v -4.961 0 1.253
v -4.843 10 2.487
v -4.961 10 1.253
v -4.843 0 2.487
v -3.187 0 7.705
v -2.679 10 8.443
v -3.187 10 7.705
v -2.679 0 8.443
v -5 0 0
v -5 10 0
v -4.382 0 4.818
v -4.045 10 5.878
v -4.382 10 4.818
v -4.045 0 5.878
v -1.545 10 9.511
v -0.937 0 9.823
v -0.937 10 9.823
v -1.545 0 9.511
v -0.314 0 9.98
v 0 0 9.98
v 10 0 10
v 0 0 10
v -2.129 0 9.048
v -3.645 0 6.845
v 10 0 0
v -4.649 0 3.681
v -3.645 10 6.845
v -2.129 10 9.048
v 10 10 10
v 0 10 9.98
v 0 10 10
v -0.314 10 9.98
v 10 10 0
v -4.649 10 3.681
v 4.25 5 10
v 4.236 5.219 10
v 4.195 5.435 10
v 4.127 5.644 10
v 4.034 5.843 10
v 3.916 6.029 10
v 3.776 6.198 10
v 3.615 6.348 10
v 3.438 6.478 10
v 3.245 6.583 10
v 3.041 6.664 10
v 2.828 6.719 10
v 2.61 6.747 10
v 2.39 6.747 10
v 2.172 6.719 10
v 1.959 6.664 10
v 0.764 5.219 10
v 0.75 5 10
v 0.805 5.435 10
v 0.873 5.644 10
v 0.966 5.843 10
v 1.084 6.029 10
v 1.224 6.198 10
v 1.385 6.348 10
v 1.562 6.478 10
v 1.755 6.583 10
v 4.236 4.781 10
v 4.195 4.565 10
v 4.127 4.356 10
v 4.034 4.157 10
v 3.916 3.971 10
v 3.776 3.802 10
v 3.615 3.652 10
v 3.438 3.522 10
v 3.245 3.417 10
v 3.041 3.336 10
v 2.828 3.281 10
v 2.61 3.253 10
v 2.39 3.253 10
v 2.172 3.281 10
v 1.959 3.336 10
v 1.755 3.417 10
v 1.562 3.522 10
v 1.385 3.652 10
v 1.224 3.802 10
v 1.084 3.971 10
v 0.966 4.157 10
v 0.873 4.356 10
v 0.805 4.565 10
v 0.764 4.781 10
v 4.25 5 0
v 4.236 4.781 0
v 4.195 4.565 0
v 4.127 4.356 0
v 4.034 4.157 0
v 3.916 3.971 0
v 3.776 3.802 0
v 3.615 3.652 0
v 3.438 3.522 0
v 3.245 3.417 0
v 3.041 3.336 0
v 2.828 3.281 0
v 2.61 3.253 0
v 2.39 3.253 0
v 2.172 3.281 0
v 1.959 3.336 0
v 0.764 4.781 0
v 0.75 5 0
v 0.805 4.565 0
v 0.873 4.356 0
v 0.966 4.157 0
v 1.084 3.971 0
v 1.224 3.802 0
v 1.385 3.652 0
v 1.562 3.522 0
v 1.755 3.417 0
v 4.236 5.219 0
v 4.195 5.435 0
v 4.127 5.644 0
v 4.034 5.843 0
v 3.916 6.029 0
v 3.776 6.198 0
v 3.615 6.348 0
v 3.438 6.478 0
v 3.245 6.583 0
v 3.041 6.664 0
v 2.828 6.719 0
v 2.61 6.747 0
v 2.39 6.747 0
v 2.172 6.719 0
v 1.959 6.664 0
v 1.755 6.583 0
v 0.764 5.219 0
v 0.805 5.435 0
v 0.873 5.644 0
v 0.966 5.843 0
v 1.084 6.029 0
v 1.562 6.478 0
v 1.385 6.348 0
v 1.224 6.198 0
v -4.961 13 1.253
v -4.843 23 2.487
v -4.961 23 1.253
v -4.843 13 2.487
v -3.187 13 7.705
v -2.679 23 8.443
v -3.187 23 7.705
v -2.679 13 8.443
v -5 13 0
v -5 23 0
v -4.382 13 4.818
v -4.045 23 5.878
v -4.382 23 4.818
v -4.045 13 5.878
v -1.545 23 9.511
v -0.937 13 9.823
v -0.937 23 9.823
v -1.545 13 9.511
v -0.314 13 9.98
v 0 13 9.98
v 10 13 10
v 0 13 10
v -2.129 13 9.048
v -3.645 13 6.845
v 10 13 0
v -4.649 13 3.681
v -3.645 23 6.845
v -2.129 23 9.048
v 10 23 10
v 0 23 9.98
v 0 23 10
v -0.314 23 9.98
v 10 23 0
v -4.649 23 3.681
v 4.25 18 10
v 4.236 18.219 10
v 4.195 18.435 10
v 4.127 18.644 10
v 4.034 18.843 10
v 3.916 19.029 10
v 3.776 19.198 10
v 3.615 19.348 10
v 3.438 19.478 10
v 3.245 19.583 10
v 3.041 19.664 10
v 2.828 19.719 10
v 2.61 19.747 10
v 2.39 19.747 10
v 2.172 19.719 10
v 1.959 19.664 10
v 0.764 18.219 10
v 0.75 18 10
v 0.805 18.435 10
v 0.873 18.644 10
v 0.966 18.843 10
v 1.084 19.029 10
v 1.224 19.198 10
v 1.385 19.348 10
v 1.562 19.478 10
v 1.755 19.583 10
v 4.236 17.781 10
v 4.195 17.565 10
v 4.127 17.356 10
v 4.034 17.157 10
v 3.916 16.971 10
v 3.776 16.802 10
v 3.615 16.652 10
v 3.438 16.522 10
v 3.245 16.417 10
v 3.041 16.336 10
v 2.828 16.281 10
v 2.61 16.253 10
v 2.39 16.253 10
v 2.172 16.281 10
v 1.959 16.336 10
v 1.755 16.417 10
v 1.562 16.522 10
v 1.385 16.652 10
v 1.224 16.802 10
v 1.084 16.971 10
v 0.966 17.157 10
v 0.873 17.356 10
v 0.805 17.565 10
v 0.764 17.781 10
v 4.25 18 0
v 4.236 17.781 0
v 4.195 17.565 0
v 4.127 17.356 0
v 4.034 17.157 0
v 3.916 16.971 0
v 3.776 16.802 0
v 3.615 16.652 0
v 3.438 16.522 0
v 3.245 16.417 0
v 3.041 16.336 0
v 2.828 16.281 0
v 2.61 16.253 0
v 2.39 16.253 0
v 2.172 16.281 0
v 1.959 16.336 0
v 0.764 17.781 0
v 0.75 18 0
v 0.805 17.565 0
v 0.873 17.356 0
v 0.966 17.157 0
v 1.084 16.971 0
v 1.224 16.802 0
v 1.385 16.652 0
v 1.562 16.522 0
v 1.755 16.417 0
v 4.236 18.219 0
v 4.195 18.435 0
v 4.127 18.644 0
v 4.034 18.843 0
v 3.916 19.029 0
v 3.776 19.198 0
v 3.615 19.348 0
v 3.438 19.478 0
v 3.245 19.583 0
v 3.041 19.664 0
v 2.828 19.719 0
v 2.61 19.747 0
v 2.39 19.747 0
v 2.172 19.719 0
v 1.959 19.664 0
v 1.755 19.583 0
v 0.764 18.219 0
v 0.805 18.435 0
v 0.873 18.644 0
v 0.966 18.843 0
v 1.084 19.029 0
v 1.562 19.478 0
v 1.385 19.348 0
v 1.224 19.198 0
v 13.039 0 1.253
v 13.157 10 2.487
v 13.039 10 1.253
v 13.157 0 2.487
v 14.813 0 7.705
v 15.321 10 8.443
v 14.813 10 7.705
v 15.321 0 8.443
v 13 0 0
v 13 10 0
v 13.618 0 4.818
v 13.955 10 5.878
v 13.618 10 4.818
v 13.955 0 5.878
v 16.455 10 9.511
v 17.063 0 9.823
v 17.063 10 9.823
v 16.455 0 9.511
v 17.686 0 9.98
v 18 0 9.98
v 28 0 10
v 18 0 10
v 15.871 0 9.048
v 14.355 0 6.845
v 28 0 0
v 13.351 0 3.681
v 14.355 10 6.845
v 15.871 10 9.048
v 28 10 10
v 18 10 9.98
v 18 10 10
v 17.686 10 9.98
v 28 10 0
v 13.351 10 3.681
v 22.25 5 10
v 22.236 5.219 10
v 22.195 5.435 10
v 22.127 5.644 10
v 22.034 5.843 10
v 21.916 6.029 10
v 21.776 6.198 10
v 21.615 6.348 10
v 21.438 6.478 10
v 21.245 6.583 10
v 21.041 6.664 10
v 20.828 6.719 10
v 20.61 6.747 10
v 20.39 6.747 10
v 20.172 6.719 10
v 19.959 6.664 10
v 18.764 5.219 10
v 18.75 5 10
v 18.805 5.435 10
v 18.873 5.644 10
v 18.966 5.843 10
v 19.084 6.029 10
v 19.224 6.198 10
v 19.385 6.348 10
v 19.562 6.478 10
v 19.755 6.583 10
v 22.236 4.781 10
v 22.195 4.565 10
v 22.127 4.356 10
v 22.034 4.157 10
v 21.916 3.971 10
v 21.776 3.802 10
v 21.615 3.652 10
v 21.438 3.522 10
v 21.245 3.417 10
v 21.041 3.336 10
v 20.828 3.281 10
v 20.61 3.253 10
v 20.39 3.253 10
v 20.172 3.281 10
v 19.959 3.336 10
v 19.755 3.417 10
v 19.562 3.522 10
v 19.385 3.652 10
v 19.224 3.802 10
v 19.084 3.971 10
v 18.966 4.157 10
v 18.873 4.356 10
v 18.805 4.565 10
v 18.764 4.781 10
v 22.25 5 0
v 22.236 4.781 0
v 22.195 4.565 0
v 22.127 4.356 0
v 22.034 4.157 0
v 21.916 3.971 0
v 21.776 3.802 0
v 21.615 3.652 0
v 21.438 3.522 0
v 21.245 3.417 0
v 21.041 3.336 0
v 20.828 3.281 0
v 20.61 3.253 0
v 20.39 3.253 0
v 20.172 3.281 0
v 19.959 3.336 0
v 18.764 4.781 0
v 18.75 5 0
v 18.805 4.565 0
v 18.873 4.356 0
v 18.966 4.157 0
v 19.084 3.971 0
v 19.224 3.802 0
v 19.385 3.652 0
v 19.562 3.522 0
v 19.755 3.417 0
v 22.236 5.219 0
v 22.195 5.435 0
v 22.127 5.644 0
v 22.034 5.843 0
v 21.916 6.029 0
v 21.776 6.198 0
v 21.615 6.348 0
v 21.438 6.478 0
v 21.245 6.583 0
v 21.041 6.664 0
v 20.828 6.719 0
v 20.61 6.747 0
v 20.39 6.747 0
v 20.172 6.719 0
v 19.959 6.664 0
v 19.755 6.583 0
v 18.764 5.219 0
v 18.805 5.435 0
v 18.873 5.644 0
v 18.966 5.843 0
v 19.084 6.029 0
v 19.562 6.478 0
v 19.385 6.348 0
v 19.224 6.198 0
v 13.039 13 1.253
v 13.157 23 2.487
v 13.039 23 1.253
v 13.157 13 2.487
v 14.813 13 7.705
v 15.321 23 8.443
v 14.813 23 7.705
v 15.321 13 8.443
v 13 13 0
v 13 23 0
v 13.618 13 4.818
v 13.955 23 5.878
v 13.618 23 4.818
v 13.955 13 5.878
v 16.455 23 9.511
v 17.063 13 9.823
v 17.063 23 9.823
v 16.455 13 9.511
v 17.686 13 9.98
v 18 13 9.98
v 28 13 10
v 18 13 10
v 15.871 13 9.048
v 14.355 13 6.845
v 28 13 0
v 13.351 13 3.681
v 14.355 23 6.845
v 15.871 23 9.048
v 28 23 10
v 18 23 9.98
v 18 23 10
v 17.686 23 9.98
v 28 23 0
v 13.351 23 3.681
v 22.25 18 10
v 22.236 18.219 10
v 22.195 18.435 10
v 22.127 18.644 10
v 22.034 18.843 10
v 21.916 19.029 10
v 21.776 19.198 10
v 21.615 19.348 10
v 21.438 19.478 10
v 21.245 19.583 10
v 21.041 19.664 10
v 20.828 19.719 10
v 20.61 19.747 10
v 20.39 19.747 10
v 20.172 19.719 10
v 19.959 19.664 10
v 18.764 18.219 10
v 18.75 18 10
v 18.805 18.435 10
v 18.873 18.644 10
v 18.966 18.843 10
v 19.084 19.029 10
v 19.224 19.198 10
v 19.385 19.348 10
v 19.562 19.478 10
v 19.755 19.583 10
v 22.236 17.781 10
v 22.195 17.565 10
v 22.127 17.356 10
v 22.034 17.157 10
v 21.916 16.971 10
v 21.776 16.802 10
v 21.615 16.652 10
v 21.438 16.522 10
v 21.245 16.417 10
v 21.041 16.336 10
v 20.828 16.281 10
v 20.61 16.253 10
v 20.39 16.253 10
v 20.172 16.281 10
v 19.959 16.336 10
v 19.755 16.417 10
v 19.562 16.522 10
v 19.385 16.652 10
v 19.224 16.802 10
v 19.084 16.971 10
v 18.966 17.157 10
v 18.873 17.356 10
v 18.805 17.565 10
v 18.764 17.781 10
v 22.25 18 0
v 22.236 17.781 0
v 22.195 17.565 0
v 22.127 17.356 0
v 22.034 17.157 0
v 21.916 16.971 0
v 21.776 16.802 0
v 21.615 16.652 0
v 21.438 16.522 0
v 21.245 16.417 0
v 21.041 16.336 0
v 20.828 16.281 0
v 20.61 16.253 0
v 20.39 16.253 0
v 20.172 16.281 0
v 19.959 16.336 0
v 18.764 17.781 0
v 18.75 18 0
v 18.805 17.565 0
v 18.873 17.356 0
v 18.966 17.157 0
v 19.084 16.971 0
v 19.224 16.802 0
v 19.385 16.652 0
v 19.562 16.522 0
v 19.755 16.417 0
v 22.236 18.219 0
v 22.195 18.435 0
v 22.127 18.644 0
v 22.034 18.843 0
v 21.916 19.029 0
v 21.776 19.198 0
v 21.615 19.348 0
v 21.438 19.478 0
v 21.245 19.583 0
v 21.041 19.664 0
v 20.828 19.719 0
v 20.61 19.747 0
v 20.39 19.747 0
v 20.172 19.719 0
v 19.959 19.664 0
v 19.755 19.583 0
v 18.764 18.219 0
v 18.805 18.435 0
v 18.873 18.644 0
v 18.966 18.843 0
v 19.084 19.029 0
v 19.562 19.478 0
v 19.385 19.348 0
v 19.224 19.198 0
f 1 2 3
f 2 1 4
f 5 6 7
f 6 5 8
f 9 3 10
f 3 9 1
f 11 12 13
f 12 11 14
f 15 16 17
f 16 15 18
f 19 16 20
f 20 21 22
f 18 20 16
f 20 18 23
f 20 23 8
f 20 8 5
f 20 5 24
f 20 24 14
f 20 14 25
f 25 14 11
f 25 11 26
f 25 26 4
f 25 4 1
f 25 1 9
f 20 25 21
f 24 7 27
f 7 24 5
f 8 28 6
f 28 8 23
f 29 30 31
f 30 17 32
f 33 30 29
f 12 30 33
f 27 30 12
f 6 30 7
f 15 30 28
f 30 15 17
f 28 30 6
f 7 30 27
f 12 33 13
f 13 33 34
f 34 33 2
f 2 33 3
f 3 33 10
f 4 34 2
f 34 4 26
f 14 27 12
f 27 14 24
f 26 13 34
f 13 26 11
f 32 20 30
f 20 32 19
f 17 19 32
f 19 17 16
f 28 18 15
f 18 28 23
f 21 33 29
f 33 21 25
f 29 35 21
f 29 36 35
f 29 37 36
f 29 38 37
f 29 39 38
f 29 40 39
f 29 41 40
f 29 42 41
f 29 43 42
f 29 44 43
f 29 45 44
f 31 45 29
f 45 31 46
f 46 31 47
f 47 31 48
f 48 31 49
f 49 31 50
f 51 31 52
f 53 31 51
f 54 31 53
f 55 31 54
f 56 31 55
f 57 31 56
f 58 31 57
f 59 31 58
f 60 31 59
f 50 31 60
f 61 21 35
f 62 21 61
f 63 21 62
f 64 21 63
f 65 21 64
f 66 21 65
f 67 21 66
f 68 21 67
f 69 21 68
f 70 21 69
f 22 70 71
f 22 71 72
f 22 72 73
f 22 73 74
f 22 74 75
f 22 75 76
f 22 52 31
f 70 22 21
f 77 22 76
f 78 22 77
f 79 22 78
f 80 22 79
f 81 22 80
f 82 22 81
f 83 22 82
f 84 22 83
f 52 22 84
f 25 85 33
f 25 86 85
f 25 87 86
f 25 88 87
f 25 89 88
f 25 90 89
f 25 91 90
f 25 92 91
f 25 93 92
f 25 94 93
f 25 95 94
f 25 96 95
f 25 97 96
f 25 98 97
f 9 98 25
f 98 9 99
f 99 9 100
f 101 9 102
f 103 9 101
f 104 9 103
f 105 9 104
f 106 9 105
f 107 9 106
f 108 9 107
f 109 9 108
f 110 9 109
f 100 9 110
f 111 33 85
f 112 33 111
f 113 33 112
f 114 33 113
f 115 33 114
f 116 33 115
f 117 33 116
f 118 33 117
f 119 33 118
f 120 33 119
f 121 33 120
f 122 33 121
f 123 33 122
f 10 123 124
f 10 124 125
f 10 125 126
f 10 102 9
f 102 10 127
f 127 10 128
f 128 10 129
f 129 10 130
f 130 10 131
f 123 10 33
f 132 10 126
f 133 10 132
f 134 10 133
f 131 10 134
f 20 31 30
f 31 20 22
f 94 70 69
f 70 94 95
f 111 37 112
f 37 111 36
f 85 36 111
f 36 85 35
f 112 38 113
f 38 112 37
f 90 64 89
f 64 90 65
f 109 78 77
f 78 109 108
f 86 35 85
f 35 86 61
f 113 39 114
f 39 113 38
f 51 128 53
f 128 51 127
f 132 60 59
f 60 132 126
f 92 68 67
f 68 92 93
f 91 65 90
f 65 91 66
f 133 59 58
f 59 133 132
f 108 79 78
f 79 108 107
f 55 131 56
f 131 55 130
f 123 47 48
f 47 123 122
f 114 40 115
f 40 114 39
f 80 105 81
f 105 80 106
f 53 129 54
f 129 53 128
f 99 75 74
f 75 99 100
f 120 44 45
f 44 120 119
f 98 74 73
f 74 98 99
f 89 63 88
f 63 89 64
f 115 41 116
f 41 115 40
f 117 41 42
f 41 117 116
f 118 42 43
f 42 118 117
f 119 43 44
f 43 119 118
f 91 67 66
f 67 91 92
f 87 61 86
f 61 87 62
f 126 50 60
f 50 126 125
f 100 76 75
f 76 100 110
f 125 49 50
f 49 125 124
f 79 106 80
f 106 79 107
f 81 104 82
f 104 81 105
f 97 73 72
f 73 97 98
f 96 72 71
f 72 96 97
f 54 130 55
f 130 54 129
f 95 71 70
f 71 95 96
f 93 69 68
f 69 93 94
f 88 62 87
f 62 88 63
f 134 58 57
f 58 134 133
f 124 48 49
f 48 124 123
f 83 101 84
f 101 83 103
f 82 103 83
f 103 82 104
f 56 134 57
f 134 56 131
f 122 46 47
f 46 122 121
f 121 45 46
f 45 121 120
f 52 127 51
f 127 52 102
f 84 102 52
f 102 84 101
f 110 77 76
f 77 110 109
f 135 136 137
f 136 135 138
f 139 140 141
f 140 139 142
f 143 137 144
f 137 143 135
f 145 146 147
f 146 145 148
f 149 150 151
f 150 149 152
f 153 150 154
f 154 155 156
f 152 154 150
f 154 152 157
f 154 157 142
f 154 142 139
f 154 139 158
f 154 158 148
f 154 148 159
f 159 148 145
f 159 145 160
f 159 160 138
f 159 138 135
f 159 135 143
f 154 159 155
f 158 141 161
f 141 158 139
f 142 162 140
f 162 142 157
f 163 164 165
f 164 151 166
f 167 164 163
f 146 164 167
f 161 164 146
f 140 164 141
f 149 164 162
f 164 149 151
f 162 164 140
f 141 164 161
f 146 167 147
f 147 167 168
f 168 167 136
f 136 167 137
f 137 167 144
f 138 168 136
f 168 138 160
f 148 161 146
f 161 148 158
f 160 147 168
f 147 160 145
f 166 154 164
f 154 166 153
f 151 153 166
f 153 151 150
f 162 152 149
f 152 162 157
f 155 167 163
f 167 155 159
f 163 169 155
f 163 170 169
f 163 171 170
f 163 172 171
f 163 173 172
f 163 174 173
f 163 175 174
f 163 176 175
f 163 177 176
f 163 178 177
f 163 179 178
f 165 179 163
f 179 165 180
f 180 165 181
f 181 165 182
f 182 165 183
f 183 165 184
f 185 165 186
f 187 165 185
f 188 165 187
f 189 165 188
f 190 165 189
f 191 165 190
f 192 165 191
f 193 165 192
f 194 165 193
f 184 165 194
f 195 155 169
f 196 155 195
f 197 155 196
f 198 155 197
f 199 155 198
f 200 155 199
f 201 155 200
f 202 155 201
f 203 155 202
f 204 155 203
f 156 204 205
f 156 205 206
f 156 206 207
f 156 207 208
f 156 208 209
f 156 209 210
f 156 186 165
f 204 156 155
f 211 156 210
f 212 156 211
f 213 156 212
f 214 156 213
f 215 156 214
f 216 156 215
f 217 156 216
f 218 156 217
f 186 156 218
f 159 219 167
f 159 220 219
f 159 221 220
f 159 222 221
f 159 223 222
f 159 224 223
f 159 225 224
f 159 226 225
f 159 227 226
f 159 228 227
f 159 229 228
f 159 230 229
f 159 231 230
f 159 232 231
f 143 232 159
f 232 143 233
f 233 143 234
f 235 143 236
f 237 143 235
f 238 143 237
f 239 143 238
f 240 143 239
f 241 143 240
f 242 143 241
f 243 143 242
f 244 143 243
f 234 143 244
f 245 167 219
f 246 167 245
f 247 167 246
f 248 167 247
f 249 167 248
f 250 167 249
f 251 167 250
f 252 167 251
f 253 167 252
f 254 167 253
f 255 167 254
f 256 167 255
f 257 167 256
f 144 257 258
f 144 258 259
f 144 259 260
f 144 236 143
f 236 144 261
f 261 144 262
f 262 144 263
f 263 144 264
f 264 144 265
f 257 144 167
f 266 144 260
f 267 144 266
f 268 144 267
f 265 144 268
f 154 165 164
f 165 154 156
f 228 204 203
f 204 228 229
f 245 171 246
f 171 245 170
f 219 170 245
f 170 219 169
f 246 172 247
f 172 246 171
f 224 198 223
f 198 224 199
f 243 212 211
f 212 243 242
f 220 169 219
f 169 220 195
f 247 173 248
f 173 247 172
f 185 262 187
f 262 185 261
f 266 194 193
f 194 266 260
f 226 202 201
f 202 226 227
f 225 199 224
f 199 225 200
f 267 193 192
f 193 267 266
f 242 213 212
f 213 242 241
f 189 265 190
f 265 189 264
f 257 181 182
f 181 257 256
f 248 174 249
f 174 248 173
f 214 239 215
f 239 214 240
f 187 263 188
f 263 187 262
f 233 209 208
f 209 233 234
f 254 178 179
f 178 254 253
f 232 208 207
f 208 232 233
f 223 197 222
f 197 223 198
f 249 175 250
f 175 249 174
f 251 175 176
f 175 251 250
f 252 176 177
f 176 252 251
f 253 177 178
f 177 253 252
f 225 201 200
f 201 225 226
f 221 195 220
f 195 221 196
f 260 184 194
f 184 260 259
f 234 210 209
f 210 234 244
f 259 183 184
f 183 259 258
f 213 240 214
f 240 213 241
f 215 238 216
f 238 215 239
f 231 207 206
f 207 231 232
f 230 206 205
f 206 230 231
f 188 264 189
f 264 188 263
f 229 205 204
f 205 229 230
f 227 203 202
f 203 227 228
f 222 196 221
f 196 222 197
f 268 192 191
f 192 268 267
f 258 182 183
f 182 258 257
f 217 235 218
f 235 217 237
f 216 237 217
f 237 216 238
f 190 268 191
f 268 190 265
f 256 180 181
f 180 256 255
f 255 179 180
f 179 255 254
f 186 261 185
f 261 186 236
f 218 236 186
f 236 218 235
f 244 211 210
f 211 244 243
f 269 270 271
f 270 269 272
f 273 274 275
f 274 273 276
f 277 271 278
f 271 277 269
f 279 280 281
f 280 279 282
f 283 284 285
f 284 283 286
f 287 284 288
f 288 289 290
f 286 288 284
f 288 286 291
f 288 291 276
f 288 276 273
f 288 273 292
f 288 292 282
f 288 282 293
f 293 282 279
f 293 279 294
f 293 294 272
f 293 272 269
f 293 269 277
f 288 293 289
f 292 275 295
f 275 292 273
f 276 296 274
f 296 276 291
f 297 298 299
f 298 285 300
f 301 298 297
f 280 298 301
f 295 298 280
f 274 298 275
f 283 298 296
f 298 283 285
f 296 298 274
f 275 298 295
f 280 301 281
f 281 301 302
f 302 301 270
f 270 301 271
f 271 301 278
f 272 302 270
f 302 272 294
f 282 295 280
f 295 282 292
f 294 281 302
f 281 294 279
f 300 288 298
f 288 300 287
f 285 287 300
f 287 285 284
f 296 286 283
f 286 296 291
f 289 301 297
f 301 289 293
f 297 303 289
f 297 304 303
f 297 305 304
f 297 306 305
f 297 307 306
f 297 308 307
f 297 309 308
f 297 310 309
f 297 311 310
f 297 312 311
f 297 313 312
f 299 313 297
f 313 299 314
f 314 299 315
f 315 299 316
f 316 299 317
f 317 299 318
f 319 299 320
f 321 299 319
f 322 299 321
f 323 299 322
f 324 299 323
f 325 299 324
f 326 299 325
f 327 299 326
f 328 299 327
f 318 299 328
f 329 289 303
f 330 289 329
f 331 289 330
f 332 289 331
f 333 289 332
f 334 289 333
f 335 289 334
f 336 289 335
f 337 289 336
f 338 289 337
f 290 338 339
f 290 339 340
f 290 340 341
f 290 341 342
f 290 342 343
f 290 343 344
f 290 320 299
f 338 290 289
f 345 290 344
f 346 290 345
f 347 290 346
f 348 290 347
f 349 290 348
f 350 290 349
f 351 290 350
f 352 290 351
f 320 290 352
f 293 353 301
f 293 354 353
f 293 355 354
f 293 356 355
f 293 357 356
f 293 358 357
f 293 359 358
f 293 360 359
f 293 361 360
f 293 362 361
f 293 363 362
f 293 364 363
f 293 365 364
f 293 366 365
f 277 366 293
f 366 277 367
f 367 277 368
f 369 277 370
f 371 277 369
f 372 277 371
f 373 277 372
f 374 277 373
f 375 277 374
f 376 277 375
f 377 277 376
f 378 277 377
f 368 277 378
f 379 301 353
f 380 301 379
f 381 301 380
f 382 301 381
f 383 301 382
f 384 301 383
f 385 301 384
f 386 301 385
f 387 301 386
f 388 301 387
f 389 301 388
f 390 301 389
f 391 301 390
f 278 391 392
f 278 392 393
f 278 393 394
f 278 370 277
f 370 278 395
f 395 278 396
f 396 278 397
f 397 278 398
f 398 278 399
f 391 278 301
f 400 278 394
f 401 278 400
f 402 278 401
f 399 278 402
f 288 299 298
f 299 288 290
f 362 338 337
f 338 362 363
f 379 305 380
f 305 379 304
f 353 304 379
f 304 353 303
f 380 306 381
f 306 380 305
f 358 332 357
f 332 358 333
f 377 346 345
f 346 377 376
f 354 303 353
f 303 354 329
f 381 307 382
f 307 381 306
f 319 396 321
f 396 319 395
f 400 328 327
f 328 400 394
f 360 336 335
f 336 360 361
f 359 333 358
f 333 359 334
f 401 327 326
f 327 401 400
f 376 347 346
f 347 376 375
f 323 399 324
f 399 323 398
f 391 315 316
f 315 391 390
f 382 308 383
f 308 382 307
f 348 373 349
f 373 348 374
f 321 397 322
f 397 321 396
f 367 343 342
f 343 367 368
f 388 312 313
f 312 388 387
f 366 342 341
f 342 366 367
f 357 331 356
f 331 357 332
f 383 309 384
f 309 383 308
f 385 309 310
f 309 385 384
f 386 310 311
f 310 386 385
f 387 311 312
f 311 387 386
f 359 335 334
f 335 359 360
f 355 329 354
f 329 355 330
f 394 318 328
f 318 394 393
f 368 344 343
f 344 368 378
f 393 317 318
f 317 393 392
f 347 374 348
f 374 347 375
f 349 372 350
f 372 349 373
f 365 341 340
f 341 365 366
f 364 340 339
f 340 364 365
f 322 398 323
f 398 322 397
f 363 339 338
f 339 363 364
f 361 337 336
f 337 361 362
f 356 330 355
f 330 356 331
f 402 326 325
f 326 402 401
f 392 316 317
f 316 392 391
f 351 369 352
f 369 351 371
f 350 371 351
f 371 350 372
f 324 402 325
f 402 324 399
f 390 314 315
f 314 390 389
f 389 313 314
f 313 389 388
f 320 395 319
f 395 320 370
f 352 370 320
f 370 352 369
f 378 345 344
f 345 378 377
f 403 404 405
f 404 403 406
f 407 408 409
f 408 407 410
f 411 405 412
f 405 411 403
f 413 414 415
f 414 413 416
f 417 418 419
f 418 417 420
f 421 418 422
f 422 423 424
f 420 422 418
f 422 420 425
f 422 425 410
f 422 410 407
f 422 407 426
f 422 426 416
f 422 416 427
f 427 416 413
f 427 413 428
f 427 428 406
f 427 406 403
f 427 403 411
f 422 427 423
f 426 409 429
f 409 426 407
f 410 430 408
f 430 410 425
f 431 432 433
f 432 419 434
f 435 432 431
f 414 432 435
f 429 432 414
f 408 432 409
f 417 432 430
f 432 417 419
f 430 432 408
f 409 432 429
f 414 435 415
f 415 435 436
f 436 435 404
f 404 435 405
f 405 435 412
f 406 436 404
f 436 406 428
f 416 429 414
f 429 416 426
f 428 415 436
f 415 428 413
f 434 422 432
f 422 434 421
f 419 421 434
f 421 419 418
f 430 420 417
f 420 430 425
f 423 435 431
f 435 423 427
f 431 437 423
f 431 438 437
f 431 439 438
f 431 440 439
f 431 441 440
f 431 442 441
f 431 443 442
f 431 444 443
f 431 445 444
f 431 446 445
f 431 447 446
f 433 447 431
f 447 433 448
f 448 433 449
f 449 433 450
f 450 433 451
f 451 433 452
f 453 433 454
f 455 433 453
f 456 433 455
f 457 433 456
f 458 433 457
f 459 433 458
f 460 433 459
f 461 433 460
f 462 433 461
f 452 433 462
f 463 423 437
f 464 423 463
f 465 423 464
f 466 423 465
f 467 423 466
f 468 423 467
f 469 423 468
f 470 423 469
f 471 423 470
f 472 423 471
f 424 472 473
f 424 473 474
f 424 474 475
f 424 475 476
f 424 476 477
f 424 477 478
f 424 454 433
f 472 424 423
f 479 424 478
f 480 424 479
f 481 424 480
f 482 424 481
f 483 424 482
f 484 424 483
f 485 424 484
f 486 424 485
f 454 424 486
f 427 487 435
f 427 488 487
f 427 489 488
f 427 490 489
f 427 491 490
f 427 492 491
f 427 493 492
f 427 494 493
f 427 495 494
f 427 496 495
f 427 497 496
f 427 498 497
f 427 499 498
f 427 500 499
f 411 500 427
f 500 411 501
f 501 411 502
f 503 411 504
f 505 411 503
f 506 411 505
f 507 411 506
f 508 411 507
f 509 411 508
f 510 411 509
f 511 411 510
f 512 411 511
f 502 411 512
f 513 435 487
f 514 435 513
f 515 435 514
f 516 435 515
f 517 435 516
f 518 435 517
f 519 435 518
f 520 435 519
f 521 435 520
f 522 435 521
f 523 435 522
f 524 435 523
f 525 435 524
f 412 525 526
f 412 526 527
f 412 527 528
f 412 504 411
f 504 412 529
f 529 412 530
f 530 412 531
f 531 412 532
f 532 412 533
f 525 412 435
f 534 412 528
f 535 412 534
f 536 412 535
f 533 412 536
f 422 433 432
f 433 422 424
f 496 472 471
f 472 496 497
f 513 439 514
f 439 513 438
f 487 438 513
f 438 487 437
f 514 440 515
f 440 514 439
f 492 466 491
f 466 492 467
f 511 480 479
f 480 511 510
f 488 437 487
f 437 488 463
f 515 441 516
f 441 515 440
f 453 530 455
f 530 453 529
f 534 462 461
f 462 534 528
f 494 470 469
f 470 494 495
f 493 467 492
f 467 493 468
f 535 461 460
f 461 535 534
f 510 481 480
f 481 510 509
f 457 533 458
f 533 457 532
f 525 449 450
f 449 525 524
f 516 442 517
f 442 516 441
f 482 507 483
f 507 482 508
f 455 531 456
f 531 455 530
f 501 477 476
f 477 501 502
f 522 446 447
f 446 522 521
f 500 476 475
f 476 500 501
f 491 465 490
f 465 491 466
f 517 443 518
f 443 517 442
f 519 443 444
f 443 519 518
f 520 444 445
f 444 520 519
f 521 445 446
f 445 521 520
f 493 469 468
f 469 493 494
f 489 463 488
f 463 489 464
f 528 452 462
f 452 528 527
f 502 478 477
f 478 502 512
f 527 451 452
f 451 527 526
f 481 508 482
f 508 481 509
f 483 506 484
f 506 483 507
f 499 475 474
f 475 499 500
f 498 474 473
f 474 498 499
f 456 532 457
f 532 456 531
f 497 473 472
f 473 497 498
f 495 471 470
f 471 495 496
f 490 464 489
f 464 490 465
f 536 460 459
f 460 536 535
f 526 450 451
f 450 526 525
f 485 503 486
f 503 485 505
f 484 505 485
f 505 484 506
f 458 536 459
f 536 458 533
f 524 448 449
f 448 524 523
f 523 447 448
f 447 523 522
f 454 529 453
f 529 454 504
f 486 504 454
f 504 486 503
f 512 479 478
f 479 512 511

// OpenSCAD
N=2;
M=2;
spacing=3;

module door_stop()
{
  span=10;
  difference()
  {
    union()
    {
      scale([0.5, 1, 1])
        rotate([-90, 0, 0])
          cylinder(r=10, h=span, $fn=50);
      cube([10, span, 10]);
    }
    // cutt bottom part
    translate([-10, -5, -15])
      cube([30, span+10, 15]);
    // drill
    translate([5/2, span/2, -5])
      cylinder(d=3.5, h=20, $fn=50);
  }
}

for(i=[0:N-1])
  for(j=[0:M-1])
    translate([i*(15+spacing), j*(10+spacing), 0])
      door_stop();
